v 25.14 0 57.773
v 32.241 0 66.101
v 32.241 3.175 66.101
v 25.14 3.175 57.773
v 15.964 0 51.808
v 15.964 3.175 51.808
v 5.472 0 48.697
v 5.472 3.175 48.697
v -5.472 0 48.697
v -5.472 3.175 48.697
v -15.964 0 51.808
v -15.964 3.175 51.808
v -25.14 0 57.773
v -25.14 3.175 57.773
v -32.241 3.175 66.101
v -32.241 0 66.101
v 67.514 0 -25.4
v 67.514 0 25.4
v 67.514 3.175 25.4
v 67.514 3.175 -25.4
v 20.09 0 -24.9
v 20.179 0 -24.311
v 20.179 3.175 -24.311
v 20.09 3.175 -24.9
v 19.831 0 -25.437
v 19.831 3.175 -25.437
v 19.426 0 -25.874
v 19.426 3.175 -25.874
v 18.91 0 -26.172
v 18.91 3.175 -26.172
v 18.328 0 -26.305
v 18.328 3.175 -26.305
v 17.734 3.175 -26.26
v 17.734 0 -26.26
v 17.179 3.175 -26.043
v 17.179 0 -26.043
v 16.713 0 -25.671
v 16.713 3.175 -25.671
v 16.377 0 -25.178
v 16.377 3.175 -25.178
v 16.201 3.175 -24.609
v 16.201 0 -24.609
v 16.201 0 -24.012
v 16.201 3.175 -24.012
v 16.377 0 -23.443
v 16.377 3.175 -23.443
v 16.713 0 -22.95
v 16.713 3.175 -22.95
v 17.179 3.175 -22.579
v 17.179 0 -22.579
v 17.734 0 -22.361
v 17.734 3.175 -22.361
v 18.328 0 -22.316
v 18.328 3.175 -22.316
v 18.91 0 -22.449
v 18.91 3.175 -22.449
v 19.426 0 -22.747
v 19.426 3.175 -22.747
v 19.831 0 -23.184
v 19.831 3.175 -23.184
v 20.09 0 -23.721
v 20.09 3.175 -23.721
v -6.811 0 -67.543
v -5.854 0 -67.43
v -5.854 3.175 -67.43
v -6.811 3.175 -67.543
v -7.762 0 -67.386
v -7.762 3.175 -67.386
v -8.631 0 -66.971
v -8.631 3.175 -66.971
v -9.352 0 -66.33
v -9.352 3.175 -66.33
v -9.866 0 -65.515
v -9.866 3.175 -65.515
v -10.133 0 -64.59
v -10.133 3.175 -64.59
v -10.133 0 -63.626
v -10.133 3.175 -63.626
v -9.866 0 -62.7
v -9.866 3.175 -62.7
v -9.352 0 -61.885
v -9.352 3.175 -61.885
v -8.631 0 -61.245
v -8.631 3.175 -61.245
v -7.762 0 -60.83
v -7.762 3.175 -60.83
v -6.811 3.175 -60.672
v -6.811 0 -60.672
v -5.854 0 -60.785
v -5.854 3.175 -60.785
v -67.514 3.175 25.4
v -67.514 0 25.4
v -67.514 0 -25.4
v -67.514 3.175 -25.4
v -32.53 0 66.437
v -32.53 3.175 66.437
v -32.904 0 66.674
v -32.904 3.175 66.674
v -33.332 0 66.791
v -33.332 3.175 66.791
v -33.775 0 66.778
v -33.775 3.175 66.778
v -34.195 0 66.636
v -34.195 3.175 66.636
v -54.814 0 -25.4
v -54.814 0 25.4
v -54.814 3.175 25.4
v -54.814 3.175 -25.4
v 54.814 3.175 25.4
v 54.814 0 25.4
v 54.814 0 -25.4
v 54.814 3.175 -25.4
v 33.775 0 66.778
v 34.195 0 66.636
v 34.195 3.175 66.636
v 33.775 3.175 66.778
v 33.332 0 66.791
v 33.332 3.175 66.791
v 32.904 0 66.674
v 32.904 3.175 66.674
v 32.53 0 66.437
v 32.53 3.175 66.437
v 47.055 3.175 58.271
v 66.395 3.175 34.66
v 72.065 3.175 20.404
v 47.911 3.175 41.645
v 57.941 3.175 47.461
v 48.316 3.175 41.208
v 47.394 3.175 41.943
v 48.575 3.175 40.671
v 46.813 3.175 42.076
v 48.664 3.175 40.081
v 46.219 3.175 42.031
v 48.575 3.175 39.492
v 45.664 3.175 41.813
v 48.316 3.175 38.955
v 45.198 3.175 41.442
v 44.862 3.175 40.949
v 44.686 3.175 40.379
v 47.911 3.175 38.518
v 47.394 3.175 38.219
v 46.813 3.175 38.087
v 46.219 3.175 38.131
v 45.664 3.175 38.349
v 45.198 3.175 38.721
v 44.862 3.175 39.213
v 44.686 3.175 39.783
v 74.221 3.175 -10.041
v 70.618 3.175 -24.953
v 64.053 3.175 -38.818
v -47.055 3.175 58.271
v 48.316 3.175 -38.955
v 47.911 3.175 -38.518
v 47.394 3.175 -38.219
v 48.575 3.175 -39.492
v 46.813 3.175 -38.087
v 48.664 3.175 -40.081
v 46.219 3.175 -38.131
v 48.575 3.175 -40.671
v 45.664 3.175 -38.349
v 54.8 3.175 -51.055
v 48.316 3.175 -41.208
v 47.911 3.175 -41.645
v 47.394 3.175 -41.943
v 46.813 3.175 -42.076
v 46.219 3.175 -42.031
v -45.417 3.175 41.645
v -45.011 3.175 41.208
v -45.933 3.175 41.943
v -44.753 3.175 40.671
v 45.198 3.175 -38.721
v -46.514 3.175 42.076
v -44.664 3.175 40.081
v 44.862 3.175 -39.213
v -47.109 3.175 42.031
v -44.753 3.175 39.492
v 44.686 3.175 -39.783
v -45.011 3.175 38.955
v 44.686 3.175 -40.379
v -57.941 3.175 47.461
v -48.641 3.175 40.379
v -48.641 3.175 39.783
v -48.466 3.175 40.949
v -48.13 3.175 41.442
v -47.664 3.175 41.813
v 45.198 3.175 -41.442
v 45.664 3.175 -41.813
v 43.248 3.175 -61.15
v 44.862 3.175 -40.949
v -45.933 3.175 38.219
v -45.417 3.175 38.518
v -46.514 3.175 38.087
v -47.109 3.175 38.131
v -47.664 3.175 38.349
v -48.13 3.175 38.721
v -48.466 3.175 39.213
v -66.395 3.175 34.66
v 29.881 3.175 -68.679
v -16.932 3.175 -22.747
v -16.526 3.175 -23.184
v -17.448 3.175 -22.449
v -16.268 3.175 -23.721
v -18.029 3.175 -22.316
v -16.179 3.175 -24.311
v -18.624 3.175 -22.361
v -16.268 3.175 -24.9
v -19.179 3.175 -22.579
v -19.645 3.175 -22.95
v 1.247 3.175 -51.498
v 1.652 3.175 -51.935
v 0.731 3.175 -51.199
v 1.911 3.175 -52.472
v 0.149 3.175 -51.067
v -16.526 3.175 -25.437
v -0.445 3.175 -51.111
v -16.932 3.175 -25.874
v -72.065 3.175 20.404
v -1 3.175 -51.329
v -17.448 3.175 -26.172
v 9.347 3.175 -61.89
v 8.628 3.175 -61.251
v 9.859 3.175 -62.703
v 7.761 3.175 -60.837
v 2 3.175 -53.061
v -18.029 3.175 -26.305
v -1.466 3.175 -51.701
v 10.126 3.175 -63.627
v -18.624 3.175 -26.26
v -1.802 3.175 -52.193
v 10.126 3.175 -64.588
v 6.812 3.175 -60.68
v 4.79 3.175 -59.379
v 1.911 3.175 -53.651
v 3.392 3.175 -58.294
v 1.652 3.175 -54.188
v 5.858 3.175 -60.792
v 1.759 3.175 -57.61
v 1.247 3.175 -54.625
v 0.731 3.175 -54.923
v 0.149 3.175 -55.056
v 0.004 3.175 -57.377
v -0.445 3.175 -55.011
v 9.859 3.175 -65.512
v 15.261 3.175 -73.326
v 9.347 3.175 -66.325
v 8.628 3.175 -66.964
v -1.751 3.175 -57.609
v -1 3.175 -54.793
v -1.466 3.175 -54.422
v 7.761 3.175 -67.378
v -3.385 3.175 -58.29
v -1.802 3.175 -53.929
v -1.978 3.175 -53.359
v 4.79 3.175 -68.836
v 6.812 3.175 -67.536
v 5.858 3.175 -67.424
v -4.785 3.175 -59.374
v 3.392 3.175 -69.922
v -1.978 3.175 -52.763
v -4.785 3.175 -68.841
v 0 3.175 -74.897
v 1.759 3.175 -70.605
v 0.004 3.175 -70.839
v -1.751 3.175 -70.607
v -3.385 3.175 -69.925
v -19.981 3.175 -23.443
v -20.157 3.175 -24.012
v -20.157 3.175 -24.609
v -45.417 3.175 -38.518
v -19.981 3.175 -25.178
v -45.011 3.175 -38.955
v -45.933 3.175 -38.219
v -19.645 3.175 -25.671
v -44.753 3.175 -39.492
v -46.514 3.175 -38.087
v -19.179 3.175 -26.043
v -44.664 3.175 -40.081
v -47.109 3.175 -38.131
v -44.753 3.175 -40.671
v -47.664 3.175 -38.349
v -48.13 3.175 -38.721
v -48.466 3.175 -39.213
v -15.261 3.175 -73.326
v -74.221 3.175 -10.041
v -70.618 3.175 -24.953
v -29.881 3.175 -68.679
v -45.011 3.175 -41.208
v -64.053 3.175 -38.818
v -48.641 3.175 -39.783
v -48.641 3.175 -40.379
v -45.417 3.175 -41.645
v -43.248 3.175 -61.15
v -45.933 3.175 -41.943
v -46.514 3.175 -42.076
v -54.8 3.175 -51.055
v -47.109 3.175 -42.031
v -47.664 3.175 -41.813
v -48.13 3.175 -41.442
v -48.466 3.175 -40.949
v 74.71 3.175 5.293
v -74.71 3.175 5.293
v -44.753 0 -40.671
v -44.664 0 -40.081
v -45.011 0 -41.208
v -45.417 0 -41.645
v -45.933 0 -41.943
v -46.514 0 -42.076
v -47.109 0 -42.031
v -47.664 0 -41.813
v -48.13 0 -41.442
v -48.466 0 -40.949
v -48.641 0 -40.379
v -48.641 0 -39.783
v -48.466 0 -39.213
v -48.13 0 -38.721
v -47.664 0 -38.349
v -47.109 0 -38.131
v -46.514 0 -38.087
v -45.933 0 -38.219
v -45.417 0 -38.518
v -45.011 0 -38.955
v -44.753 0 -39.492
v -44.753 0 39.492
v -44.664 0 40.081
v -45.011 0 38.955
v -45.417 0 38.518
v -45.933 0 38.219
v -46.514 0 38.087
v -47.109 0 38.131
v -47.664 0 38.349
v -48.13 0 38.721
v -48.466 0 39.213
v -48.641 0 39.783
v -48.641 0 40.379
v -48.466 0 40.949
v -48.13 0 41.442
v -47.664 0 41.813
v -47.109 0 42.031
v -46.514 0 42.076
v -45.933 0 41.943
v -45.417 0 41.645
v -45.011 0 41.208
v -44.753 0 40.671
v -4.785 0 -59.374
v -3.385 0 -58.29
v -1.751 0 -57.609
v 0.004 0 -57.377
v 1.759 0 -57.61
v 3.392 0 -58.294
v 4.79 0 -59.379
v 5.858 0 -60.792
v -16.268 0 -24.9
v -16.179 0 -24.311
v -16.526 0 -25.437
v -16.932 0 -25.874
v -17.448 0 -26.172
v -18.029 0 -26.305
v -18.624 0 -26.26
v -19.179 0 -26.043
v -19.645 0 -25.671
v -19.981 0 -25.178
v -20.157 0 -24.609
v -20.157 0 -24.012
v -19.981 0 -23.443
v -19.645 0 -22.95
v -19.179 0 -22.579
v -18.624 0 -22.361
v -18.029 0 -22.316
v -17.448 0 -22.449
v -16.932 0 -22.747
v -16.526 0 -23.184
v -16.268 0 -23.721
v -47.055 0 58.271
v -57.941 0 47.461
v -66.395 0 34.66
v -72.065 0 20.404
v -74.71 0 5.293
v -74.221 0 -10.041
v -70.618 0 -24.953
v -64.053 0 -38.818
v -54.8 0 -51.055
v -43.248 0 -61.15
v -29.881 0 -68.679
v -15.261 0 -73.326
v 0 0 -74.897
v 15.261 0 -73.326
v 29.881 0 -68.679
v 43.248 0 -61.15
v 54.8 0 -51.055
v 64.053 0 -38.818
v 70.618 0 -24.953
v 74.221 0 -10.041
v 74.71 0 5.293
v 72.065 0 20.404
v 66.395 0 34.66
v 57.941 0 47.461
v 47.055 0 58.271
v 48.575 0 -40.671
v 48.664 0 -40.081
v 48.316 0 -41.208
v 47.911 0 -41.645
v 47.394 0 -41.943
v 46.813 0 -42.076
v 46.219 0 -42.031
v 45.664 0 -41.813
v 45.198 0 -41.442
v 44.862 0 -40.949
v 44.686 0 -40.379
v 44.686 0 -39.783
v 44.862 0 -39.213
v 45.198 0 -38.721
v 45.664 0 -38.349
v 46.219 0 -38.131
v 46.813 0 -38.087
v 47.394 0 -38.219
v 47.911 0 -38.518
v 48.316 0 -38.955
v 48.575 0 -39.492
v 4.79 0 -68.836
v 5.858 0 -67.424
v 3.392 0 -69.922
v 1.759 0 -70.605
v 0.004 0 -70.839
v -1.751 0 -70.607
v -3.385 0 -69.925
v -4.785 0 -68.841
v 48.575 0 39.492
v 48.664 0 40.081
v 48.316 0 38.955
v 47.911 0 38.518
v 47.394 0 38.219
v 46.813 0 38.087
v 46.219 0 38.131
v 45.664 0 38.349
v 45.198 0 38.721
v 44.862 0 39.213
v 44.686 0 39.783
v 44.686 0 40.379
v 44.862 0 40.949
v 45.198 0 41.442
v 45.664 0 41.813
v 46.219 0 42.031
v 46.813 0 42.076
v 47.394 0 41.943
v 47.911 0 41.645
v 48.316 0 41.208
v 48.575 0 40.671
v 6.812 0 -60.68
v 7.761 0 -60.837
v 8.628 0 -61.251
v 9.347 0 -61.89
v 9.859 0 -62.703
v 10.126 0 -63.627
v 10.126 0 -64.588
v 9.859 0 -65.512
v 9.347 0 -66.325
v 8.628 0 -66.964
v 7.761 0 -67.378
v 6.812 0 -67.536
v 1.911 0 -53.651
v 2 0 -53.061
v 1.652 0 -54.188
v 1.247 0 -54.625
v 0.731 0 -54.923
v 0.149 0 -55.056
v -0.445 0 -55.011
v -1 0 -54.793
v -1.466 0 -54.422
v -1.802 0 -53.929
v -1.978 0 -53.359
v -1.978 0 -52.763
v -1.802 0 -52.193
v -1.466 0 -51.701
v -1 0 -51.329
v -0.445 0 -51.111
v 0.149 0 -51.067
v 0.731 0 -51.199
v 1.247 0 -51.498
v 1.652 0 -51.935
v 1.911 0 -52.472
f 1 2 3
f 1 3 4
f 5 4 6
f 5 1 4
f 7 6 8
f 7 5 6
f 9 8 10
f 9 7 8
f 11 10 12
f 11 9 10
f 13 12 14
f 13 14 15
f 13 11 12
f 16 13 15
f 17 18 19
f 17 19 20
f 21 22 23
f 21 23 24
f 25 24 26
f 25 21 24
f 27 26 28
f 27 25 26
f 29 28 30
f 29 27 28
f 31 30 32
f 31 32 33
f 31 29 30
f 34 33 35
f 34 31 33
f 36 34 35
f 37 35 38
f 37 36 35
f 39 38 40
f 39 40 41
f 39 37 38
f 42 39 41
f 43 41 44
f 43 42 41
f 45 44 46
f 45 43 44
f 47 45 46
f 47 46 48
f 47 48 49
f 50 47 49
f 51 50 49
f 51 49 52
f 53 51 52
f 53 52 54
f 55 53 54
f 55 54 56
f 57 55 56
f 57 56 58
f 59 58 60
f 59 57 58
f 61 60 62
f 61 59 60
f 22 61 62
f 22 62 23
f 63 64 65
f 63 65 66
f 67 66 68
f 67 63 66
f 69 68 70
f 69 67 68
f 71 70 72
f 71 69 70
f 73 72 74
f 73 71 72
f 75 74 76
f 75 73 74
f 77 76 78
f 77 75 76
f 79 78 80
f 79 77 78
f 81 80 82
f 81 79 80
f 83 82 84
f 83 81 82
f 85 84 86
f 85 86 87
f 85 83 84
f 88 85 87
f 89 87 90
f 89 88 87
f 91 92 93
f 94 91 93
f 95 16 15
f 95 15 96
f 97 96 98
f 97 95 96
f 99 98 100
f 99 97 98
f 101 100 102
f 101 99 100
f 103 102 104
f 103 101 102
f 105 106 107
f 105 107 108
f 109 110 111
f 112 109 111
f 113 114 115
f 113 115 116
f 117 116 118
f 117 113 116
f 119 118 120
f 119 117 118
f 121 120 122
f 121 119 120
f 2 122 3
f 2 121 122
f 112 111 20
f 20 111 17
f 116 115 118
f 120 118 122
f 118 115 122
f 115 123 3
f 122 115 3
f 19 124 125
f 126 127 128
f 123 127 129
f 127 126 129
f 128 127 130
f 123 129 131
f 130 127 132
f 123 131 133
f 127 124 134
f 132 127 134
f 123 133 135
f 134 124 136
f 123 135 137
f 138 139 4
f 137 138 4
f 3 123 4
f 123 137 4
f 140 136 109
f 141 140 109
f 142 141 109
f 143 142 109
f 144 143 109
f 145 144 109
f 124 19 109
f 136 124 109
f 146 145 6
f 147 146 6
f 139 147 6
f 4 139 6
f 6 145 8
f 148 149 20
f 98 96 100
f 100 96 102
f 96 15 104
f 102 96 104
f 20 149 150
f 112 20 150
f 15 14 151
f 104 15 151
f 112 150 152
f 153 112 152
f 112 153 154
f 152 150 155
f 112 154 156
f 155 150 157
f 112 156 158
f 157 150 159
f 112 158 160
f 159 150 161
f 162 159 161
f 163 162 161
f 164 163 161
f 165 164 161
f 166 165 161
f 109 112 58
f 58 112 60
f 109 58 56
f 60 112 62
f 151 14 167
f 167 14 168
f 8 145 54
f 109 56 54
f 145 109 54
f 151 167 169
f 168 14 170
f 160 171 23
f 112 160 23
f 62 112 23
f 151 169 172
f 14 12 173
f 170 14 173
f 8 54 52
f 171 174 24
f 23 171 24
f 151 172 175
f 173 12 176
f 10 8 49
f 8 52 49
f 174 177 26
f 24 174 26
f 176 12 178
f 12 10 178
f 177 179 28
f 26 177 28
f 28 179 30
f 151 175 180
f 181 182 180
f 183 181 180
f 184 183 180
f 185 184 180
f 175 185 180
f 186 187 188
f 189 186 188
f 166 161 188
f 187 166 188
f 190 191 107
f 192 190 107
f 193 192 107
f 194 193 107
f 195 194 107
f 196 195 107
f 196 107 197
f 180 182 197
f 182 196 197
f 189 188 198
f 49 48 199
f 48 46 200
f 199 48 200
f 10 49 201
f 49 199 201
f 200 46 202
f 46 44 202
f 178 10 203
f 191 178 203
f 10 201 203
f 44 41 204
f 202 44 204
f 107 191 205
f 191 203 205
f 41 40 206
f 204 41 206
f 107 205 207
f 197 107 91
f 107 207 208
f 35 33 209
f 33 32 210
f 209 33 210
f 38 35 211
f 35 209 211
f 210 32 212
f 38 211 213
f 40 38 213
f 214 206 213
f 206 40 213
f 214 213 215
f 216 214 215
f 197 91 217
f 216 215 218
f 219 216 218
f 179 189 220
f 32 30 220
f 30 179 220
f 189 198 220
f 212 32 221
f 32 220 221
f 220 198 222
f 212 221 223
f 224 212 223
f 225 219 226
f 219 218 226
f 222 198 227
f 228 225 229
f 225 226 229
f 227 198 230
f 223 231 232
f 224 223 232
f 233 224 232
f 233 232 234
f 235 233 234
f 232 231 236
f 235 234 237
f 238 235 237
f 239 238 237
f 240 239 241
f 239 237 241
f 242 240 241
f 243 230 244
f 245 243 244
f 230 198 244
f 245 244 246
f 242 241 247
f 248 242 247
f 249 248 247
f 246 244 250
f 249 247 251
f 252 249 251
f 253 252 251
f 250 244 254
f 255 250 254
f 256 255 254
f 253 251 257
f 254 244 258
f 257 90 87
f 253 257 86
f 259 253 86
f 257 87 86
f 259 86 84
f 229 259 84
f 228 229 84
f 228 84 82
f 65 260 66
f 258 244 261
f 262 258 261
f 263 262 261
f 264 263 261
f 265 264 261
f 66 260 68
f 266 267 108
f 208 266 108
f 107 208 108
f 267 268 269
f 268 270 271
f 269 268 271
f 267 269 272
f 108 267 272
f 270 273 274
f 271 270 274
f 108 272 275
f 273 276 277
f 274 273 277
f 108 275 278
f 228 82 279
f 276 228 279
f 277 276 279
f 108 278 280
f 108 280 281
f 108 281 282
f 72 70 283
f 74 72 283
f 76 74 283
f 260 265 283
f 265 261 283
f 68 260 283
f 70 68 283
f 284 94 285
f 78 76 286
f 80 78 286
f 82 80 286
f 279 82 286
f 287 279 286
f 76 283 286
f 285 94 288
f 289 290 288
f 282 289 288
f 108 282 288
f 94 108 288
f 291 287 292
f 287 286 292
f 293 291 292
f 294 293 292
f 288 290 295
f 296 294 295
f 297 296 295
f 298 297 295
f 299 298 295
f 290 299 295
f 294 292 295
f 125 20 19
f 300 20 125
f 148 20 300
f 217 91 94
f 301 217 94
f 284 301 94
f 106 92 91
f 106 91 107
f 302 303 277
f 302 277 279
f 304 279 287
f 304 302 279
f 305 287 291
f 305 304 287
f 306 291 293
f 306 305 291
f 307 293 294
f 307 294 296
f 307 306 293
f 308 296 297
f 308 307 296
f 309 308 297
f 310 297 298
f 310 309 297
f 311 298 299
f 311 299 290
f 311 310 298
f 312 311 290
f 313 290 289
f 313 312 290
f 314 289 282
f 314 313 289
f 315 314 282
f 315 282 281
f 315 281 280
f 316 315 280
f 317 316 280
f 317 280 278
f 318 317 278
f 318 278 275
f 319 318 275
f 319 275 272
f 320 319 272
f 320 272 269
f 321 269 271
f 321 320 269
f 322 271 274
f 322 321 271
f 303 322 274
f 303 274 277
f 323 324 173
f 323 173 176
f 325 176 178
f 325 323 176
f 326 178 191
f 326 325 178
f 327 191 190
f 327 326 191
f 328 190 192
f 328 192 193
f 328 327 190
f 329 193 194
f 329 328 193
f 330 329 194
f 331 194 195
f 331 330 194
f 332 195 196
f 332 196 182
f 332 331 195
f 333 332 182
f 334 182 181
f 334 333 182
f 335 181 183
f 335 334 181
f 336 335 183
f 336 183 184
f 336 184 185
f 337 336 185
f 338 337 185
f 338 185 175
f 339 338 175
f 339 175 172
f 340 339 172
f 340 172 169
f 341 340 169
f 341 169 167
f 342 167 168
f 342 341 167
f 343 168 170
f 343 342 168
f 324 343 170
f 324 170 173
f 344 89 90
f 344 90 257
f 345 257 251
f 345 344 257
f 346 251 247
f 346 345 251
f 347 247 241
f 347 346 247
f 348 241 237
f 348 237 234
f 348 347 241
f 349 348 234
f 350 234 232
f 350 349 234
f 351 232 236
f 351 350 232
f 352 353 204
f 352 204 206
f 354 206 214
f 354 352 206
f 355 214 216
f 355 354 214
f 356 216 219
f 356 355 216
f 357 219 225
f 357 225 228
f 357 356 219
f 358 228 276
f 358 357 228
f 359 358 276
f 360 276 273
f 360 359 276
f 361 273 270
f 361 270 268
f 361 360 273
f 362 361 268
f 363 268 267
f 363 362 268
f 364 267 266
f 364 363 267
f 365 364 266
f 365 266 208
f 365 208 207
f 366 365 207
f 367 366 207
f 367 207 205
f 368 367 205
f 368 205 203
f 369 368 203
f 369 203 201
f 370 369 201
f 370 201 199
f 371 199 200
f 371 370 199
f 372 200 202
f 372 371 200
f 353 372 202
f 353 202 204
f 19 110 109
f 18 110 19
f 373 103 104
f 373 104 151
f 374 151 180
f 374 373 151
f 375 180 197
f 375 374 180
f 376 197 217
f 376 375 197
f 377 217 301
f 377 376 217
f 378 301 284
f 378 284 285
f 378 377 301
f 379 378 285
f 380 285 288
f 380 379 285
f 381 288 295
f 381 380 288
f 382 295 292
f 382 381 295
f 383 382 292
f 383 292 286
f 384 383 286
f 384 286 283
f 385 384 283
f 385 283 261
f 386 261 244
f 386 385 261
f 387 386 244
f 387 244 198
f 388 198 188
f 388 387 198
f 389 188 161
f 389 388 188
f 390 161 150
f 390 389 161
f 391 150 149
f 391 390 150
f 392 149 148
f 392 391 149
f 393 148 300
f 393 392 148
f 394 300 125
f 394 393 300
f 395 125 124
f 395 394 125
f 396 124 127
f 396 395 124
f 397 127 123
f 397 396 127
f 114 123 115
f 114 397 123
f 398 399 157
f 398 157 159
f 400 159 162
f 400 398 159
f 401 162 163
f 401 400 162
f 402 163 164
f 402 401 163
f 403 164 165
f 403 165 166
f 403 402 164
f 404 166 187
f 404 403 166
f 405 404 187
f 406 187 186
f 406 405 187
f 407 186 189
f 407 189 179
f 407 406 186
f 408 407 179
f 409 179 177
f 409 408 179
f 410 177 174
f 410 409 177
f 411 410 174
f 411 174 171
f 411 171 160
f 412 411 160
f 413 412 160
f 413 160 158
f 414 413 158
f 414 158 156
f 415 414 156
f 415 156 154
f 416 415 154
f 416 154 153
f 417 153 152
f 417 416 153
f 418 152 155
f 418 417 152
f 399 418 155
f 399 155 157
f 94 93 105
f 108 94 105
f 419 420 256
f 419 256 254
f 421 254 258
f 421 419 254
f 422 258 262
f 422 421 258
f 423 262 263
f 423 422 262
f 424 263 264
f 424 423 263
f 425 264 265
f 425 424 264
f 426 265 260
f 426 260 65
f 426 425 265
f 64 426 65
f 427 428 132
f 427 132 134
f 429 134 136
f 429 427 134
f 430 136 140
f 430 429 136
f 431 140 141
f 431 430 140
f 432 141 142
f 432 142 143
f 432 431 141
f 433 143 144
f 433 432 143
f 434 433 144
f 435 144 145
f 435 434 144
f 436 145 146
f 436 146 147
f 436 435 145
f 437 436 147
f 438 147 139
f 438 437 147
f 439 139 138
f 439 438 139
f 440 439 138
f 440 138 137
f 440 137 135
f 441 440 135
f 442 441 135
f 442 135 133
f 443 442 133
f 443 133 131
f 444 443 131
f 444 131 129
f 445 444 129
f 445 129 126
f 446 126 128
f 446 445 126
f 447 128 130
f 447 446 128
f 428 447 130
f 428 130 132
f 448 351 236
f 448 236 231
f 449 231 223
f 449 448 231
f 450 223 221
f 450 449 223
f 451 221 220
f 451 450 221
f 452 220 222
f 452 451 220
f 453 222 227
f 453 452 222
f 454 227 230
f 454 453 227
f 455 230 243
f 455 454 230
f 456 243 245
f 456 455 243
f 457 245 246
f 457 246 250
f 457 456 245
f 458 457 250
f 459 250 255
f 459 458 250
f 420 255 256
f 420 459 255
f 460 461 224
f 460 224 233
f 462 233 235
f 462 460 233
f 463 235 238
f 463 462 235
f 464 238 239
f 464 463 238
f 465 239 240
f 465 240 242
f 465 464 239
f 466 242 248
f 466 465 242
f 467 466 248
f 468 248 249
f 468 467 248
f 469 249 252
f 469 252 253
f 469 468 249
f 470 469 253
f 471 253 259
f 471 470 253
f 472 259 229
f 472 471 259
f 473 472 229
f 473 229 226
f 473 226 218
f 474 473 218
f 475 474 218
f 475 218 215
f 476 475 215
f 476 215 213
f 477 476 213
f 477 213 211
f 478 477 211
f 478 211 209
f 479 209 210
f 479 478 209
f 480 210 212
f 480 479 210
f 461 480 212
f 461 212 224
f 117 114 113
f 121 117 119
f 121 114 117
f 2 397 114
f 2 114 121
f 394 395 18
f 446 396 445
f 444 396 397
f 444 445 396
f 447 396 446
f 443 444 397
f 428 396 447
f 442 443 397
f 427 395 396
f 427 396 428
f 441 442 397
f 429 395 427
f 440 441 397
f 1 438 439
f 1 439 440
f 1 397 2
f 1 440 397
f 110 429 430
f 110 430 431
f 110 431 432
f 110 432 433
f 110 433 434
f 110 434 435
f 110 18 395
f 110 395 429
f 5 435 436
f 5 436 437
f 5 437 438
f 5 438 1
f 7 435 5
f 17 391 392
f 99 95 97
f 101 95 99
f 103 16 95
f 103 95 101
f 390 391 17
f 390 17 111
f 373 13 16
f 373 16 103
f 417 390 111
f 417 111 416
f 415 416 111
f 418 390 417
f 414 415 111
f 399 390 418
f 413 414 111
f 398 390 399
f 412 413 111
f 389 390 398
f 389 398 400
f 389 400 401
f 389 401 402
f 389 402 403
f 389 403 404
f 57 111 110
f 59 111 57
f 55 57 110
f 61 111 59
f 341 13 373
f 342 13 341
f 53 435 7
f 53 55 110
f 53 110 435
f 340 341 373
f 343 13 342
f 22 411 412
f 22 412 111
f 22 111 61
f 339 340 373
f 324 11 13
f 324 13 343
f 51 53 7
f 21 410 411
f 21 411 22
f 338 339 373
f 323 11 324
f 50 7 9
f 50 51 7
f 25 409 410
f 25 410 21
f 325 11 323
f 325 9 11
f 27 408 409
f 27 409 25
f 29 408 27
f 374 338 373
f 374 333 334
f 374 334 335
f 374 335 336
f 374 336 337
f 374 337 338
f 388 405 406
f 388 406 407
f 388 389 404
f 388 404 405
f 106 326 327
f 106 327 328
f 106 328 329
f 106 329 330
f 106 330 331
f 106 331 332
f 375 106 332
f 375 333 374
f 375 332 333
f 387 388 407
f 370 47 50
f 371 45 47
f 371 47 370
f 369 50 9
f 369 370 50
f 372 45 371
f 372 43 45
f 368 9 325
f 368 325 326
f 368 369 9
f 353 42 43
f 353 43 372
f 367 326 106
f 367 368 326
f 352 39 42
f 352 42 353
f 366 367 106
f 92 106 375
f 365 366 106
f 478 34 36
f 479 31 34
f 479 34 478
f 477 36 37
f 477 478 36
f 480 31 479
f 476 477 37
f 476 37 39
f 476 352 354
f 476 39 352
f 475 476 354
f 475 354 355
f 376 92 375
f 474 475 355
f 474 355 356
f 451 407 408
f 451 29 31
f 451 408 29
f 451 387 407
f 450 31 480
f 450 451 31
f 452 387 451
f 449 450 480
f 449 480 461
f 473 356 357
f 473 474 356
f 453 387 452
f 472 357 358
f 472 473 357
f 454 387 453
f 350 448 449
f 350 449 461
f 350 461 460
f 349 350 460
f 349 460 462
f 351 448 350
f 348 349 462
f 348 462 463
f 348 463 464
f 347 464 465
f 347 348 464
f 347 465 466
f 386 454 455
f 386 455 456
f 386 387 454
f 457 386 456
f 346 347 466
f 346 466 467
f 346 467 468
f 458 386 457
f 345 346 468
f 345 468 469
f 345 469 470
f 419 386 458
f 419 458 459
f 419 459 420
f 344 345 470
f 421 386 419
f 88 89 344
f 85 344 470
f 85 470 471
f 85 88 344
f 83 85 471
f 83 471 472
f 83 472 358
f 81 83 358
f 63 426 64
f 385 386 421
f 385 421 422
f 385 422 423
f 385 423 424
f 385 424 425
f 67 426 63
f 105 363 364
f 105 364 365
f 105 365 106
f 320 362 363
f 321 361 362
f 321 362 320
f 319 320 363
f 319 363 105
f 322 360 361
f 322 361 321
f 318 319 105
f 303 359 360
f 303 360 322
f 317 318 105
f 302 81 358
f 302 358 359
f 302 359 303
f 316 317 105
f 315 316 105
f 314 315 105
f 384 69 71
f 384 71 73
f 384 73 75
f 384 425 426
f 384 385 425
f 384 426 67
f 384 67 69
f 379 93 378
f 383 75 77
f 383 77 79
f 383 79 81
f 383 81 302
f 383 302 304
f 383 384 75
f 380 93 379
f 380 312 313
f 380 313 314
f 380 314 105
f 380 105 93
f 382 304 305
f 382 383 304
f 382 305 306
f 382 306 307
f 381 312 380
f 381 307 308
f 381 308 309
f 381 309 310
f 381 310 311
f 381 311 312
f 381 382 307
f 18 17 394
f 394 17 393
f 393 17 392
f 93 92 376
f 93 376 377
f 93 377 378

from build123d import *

# Parameters (mm, degrees)
SKETCH1_R           = 2
SKETCH1_W           = 12.7
SKETCH1_H           = 50.8
BOSS_EXTRUDE3_DEPTH = 3.175


with BuildPart() as part:
    # Sketch1 → Boss-Extrude3 (new body)
    with BuildSketch(Plane(origin=(0, 0, 0), x_dir=(1, 0, 0), z_dir=(0, 1, 0))):
        with BuildLine():
            ThreePointArc((34.194833578, -66.63583839), (33.11372382, -66.748004461), (32.240681933, -66.10056535))
            ThreePointArc((32.240681933, -66.10056535), (0, -48.302004425), (-32.240681933, -66.10056535))
            ThreePointArc((-32.240681933, -66.10056535), (-33.11372382, -66.748004461), (-34.194833578, -66.63583839))
            ThreePointArc((-34.194833578, -66.63583839), (0, 74.897407173), (34.194833578, -66.63583839))
        make_face()
        with Locations((0, 53.061187965)):
            Circle(SKETCH1_R, mode=Mode.SUBTRACT)
        with Locations((18.178952795, 24.310551096)):
            Circle(SKETCH1_R, mode=Mode.SUBTRACT)
        with Locations((46.663733983, 40.081231883)):
            Circle(SKETCH1_R, mode=Mode.SUBTRACT)
        with Locations((46.663733983, -40.081231883)):
            Circle(SKETCH1_R, mode=Mode.SUBTRACT)
        with Locations((-46.663733983, -40.081231883)):
            Circle(SKETCH1_R, mode=Mode.SUBTRACT)
        with Locations((-18.178952795, 24.310551096)):
            Circle(SKETCH1_R, mode=Mode.SUBTRACT)
        with Locations((-46.663733983, 40.081231883)):
            Circle(SKETCH1_R, mode=Mode.SUBTRACT)
        with Locations((61.164123727, 0)):
            Rectangle(SKETCH1_W, SKETCH1_H, mode=Mode.SUBTRACT)
        with Locations((-61.164123727, 0)):
            Rectangle(SKETCH1_W, SKETCH1_H, mode=Mode.SUBTRACT)
        with BuildLine():
            ThreePointArc((-5.853899988, 60.78531778), (0.003726822, 57.376699875), (5.857575472, 60.791802193))
            ThreePointArc((5.857575472, 60.791802193), (10.16, 64.107698843), (5.857575472, 67.423595493))
            ThreePointArc((5.857575472, 67.423595493), (0.003726822, 70.838697812), (-5.853899988, 67.430079907))
            ThreePointArc((-5.853899988, 67.430079907), (-10.167207264, 64.107698843), (-5.853899988, 60.78531778))
        make_face(mode=Mode.SUBTRACT)
    extrude(amount=BOSS_EXTRUDE3_DEPTH)


solid = part.part
